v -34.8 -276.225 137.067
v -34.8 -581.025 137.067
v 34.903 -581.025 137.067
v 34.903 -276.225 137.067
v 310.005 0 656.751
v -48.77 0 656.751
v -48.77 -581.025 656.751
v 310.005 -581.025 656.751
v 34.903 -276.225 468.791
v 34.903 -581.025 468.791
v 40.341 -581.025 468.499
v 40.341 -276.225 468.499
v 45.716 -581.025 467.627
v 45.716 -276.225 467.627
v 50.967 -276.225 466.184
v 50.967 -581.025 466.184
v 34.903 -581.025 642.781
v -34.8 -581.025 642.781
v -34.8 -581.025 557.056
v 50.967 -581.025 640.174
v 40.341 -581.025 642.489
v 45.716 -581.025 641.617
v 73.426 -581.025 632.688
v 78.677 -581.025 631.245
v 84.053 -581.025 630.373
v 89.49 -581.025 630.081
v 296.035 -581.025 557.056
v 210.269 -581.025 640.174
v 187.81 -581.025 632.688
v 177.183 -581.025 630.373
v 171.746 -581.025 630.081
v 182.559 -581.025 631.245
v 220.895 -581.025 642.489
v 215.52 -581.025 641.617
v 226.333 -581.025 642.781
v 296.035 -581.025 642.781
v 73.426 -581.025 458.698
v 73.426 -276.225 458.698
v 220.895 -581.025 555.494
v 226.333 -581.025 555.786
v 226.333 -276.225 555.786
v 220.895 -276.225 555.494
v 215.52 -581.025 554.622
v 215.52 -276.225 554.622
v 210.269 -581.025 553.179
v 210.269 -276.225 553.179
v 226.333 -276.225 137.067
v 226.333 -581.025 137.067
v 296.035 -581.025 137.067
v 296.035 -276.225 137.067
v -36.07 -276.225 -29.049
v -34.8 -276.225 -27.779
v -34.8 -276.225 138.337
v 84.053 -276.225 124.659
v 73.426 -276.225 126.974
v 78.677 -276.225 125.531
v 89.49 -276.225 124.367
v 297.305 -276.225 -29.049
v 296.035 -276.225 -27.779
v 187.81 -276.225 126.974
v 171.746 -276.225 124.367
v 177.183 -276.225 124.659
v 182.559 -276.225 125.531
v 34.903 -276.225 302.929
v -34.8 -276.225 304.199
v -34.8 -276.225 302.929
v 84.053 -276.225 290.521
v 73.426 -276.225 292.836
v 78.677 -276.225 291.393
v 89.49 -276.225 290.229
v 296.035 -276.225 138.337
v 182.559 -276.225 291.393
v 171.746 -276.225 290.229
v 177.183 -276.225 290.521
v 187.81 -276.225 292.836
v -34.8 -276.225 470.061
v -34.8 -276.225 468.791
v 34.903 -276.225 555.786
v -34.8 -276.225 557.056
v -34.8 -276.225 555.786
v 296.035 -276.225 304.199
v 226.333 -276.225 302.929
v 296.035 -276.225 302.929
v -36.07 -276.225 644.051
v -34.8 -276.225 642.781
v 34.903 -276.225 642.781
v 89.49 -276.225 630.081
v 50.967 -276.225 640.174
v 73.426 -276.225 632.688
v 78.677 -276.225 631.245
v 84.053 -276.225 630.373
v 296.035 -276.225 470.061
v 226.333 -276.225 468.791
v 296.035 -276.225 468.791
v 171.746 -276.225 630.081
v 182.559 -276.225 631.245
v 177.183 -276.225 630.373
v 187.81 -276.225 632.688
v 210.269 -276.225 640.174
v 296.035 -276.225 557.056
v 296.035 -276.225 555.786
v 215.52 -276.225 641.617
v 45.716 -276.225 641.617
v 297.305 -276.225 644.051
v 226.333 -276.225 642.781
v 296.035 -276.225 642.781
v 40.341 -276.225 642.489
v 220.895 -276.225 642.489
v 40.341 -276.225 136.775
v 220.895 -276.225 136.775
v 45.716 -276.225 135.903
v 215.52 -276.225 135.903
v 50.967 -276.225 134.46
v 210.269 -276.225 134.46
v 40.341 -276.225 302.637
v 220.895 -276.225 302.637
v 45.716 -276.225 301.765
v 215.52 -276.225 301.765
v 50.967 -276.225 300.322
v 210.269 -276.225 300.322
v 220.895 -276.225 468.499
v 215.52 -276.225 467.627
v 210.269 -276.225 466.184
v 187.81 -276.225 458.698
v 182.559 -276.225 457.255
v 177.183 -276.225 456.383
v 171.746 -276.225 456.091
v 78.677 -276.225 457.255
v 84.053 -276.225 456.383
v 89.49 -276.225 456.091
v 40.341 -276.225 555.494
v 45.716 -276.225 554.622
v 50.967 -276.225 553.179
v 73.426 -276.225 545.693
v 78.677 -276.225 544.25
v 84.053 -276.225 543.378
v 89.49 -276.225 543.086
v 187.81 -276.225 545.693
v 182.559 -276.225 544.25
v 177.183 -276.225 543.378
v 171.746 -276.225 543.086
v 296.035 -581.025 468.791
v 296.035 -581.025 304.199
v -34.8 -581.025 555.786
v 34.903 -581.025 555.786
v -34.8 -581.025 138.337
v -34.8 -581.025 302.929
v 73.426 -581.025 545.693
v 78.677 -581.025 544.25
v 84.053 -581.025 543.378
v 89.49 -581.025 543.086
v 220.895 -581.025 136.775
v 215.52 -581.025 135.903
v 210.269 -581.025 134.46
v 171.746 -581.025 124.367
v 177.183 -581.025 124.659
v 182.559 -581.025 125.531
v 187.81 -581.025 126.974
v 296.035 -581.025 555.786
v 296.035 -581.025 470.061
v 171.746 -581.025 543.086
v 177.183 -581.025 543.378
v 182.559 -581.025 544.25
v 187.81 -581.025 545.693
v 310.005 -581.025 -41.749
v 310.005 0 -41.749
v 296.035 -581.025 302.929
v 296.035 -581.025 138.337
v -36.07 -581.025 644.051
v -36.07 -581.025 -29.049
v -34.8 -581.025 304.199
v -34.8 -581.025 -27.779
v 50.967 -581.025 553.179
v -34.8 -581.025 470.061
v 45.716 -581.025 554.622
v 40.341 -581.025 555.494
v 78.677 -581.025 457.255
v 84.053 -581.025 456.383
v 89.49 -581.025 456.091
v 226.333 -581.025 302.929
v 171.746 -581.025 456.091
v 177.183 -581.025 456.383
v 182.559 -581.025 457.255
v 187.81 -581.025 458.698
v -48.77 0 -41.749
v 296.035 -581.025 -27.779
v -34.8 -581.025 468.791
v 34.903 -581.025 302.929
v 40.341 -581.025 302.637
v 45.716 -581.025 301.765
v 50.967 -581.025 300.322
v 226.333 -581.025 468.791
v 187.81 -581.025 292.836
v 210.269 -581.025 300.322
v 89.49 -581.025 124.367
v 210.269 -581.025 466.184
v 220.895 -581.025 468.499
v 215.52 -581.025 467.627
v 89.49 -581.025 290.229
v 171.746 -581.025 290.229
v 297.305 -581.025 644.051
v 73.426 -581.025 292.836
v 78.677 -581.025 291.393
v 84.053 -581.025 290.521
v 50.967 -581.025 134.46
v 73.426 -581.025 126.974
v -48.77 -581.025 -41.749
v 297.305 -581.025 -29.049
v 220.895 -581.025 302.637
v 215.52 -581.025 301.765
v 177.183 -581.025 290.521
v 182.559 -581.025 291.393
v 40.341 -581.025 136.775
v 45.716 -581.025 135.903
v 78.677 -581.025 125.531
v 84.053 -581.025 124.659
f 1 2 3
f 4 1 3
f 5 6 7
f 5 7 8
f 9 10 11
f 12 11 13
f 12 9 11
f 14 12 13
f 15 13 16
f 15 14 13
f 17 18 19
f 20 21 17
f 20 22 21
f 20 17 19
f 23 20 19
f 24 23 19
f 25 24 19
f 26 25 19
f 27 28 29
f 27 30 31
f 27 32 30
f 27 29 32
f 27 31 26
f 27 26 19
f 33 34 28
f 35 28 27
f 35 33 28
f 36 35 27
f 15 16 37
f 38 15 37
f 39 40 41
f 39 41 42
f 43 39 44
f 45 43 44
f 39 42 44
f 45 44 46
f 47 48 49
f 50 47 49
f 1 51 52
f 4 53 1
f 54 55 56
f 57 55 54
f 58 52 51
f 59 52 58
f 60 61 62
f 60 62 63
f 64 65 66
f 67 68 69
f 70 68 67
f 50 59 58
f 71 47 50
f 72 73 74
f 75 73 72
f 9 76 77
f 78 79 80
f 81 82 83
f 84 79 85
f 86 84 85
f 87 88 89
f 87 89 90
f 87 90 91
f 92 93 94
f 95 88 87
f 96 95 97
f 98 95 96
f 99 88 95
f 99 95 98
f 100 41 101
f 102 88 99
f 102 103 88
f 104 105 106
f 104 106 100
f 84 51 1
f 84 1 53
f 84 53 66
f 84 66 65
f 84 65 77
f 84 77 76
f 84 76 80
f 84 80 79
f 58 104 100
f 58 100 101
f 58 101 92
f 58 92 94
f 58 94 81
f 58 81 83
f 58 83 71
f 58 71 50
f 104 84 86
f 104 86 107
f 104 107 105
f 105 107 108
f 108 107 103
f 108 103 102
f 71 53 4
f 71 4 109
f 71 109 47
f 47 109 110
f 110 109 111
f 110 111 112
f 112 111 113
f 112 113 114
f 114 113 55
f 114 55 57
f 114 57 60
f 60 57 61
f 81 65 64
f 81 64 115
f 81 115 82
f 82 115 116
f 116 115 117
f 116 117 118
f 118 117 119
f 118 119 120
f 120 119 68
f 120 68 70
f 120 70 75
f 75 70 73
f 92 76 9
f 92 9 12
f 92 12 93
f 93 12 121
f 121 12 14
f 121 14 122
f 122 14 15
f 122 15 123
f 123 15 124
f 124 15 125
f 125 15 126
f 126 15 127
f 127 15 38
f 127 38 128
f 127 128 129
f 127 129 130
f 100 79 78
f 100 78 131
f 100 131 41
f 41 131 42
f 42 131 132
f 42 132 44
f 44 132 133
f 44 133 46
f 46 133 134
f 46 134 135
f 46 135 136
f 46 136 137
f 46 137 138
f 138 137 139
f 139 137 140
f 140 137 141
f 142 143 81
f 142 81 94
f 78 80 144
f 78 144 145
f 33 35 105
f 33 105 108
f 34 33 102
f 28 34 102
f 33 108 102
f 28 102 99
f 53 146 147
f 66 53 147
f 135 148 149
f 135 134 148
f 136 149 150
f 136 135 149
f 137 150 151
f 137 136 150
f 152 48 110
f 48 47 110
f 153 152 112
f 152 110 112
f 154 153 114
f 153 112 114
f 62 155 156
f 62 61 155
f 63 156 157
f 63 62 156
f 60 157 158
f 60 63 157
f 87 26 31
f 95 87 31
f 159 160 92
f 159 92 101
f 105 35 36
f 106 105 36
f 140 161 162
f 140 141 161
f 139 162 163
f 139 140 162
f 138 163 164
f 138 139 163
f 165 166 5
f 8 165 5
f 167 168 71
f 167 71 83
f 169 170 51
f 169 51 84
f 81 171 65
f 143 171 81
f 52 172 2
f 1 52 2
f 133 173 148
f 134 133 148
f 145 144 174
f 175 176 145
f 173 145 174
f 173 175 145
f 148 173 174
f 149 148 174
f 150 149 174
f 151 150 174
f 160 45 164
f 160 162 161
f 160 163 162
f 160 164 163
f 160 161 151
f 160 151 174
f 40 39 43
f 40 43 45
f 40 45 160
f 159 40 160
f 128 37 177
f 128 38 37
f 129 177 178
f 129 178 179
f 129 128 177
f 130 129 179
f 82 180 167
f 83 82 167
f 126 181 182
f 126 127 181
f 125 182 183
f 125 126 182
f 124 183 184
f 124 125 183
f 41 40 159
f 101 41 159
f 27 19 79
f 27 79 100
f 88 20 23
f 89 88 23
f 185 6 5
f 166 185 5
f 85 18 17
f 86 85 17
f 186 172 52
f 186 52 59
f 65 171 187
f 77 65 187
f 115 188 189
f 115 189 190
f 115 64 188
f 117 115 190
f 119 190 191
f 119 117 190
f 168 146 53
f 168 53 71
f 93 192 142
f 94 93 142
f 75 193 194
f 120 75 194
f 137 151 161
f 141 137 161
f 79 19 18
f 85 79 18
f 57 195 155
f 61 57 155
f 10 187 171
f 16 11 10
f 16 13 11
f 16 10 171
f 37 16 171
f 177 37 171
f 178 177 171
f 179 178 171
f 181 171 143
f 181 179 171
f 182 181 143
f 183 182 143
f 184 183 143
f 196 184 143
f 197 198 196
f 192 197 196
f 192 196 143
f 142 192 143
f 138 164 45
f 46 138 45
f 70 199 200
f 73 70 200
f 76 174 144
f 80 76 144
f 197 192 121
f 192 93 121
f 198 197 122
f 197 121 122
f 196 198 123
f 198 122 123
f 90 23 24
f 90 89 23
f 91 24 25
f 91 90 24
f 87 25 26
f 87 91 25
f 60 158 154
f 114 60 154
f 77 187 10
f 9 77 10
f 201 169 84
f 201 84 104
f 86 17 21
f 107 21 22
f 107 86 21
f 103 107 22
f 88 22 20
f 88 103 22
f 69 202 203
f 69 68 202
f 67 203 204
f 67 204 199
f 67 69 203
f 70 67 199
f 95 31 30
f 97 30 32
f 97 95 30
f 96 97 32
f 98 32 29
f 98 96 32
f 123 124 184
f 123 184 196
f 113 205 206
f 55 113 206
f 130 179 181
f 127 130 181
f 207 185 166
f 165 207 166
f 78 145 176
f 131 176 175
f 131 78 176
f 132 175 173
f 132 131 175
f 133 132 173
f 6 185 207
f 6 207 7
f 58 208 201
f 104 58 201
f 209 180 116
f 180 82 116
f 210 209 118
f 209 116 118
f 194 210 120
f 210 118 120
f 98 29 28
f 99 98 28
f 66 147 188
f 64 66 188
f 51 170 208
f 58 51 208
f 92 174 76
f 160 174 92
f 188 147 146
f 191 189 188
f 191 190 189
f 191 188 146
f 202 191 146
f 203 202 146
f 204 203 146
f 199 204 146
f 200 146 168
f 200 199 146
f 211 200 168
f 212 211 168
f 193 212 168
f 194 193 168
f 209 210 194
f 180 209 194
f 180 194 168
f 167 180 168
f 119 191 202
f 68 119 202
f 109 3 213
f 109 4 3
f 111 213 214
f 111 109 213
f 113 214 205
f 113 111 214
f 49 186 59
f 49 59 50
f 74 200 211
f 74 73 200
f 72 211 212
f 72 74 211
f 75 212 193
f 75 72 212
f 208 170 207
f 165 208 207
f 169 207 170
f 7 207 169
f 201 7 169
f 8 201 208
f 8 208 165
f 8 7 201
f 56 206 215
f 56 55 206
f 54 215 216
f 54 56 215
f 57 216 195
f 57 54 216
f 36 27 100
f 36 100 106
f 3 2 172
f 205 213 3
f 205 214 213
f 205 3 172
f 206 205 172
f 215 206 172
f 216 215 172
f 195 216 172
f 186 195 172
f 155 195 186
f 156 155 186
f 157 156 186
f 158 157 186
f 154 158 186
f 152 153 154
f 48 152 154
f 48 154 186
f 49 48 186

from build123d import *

# Parameters (mm, degrees)
F0_W      = 358.775
F0_H      = 698.5
F1_DEPTH  = 581.025
F2_W      = 333.375
F2_H      = 673.1
F2_W_2    = 330.835
F2_H_2    = 670.56
F3_DEPTH  = 304.8
F4_W      = 330.835
F4_H      = 1.27
F4_W_2    = 333.375
F4_W_3    = 332.105
F5_DEPTH  = 304.8
F7_DEPTH  = 304.8
F8_R      = 50.8
F10_DEPTH = 304.8
F11_R     = 50.8
F13_DEPTH = 304.8
F14_R     = 50.8
F16_DEPTH = 304.8
F17_R     = 50.8
F19_DEPTH = 304.8
F20_R     = 50.8


with BuildPart() as f1:
    # F0 (on Front) → F1 (new body)
    with BuildSketch(Plane.XZ):
        with Locations((130.6179589152, 307.5007573068)):
            Rectangle(F0_W, F0_H)
    extrude(amount=F1_DEPTH)

    # F2 (on face) → F3 (cut)
    with BuildSketch(Plane.XZ.offset(581.025)):
        with Locations((130.6179589152, 307.5007573068)):
            Rectangle(F2_W, F2_H)
        with Locations((130.6179589152, 307.5007573068)):
            Rectangle(F2_W_2, F2_H_2, mode=Mode.SUBTRACT)
    extrude(amount=-F3_DEPTH, mode=Mode.SUBTRACT)

    # F4 (on face) → F5 (cut)
    with BuildSketch(Plane.XZ.offset(581.025)):
        with Locations((130.6179589152, 556.4207573068)):
            Rectangle(F4_W, F4_H)
        with Locations((130.6179589152, 469.4257573068)):
            Rectangle(F4_W_2, F4_H)
        with Locations((129.9829589152, 303.5637573068)):
            Rectangle(F4_W_3, F4_H)
        with Locations((131.2529589152, 137.7017573068)):
            Rectangle(F4_W_3, F4_H)
    extrude(amount=-F5_DEPTH, mode=Mode.SUBTRACT)

    # F6 (on face) → F7 (cut)
    with BuildSketch(Plane.XZ.offset(581.025)):
        Polygon((218.0892089152, 642.7807573068), (43.1467089152, 642.7807573068), (81.2467089152, 630.0807573068), (179.9892089152, 630.0807573068), align=None)
    extrude(amount=-F7_DEPTH, mode=Mode.SUBTRACT)

    # F8
    f8_edges = [f1.edges().sort_by_distance(p)[0] for p in [
        (43.146709, -428.625, 642.780757),
        (81.246709, -428.625, 630.080757),
        (179.989209, -428.625, 630.080757),
        (218.089209, -428.625, 642.780757),
    ]]
    fillet(f8_edges, radius=F8_R)

    # F9 (on face) → F10 (cut)
    with BuildSketch(Plane.XZ.offset(581.025)):
        Polygon((218.0892089152, 555.7857573068), (43.1467089152, 555.7857573068), (81.2467089152, 543.0857573068), (179.9892089152, 543.0857573068), align=None)
    extrude(amount=-F10_DEPTH, mode=Mode.SUBTRACT)

    # F11
    f11_edges = [f1.edges().sort_by_distance(p)[0] for p in [
        (43.146709, -428.625, 555.785757),
        (81.246709, -428.625, 543.085757),
        (218.089209, -428.625, 555.785757),
        (179.989209, -428.625, 543.085757),
    ]]
    fillet(f11_edges, radius=F11_R)

    # F12 (on face) → F13 (cut)
    with BuildSketch(Plane.XZ.offset(581.025)):
        Polygon((218.0892089152, 468.7907573068), (43.1467089152, 468.7907573068), (81.2467089152, 456.0907573068), (179.9892089152, 456.0907573068), align=None)
    extrude(amount=-F13_DEPTH, mode=Mode.SUBTRACT)

    # F14
    f14_edges = [f1.edges().sort_by_distance(p)[0] for p in [
        (43.146709, -428.625, 468.790757),
        (81.246709, -428.625, 456.090757),
        (179.989209, -428.625, 456.090757),
        (218.089209, -428.625, 468.790757),
    ]]
    fillet(f14_edges, radius=F14_R)

    # F15 (on face) → F16 (cut)
    with BuildSketch(Plane.XZ.offset(581.025)):
        Polygon((218.0892089152, 302.9287573068), (43.1467089152, 302.9287573068), (81.2467089152, 290.2287573068), (179.9892089152, 290.2287573068), align=None)
    extrude(amount=-F16_DEPTH, mode=Mode.SUBTRACT)

    # F17
    f17_edges = [f1.edges().sort_by_distance(p)[0] for p in [
        (43.146709, -428.625, 302.928757),
        (81.246709, -428.625, 290.228757),
        (179.989209, -428.625, 290.228757),
        (218.089209, -428.625, 302.928757),
    ]]
    fillet(f17_edges, radius=F17_R)

    # F18 (on face) → F19 (cut)
    with BuildSketch(Plane.XZ.offset(581.025)):
        Polygon((218.0892089152, 137.0667573068), (43.1467089152, 137.0667573068), (81.2467089152, 124.3667573068), (179.9892089152, 124.3667573068), align=None)
    extrude(amount=-F19_DEPTH, mode=Mode.SUBTRACT)

    # F20
    f20_edges = [f1.edges().sort_by_distance(p)[0] for p in [
        (43.146709, -428.625, 137.066757),
        (81.246709, -428.625, 124.366757),
        (179.989209, -428.625, 124.366757),
        (218.089209, -428.625, 137.066757),
    ]]
    fillet(f20_edges, radius=F20_R)


solid = f1.part
